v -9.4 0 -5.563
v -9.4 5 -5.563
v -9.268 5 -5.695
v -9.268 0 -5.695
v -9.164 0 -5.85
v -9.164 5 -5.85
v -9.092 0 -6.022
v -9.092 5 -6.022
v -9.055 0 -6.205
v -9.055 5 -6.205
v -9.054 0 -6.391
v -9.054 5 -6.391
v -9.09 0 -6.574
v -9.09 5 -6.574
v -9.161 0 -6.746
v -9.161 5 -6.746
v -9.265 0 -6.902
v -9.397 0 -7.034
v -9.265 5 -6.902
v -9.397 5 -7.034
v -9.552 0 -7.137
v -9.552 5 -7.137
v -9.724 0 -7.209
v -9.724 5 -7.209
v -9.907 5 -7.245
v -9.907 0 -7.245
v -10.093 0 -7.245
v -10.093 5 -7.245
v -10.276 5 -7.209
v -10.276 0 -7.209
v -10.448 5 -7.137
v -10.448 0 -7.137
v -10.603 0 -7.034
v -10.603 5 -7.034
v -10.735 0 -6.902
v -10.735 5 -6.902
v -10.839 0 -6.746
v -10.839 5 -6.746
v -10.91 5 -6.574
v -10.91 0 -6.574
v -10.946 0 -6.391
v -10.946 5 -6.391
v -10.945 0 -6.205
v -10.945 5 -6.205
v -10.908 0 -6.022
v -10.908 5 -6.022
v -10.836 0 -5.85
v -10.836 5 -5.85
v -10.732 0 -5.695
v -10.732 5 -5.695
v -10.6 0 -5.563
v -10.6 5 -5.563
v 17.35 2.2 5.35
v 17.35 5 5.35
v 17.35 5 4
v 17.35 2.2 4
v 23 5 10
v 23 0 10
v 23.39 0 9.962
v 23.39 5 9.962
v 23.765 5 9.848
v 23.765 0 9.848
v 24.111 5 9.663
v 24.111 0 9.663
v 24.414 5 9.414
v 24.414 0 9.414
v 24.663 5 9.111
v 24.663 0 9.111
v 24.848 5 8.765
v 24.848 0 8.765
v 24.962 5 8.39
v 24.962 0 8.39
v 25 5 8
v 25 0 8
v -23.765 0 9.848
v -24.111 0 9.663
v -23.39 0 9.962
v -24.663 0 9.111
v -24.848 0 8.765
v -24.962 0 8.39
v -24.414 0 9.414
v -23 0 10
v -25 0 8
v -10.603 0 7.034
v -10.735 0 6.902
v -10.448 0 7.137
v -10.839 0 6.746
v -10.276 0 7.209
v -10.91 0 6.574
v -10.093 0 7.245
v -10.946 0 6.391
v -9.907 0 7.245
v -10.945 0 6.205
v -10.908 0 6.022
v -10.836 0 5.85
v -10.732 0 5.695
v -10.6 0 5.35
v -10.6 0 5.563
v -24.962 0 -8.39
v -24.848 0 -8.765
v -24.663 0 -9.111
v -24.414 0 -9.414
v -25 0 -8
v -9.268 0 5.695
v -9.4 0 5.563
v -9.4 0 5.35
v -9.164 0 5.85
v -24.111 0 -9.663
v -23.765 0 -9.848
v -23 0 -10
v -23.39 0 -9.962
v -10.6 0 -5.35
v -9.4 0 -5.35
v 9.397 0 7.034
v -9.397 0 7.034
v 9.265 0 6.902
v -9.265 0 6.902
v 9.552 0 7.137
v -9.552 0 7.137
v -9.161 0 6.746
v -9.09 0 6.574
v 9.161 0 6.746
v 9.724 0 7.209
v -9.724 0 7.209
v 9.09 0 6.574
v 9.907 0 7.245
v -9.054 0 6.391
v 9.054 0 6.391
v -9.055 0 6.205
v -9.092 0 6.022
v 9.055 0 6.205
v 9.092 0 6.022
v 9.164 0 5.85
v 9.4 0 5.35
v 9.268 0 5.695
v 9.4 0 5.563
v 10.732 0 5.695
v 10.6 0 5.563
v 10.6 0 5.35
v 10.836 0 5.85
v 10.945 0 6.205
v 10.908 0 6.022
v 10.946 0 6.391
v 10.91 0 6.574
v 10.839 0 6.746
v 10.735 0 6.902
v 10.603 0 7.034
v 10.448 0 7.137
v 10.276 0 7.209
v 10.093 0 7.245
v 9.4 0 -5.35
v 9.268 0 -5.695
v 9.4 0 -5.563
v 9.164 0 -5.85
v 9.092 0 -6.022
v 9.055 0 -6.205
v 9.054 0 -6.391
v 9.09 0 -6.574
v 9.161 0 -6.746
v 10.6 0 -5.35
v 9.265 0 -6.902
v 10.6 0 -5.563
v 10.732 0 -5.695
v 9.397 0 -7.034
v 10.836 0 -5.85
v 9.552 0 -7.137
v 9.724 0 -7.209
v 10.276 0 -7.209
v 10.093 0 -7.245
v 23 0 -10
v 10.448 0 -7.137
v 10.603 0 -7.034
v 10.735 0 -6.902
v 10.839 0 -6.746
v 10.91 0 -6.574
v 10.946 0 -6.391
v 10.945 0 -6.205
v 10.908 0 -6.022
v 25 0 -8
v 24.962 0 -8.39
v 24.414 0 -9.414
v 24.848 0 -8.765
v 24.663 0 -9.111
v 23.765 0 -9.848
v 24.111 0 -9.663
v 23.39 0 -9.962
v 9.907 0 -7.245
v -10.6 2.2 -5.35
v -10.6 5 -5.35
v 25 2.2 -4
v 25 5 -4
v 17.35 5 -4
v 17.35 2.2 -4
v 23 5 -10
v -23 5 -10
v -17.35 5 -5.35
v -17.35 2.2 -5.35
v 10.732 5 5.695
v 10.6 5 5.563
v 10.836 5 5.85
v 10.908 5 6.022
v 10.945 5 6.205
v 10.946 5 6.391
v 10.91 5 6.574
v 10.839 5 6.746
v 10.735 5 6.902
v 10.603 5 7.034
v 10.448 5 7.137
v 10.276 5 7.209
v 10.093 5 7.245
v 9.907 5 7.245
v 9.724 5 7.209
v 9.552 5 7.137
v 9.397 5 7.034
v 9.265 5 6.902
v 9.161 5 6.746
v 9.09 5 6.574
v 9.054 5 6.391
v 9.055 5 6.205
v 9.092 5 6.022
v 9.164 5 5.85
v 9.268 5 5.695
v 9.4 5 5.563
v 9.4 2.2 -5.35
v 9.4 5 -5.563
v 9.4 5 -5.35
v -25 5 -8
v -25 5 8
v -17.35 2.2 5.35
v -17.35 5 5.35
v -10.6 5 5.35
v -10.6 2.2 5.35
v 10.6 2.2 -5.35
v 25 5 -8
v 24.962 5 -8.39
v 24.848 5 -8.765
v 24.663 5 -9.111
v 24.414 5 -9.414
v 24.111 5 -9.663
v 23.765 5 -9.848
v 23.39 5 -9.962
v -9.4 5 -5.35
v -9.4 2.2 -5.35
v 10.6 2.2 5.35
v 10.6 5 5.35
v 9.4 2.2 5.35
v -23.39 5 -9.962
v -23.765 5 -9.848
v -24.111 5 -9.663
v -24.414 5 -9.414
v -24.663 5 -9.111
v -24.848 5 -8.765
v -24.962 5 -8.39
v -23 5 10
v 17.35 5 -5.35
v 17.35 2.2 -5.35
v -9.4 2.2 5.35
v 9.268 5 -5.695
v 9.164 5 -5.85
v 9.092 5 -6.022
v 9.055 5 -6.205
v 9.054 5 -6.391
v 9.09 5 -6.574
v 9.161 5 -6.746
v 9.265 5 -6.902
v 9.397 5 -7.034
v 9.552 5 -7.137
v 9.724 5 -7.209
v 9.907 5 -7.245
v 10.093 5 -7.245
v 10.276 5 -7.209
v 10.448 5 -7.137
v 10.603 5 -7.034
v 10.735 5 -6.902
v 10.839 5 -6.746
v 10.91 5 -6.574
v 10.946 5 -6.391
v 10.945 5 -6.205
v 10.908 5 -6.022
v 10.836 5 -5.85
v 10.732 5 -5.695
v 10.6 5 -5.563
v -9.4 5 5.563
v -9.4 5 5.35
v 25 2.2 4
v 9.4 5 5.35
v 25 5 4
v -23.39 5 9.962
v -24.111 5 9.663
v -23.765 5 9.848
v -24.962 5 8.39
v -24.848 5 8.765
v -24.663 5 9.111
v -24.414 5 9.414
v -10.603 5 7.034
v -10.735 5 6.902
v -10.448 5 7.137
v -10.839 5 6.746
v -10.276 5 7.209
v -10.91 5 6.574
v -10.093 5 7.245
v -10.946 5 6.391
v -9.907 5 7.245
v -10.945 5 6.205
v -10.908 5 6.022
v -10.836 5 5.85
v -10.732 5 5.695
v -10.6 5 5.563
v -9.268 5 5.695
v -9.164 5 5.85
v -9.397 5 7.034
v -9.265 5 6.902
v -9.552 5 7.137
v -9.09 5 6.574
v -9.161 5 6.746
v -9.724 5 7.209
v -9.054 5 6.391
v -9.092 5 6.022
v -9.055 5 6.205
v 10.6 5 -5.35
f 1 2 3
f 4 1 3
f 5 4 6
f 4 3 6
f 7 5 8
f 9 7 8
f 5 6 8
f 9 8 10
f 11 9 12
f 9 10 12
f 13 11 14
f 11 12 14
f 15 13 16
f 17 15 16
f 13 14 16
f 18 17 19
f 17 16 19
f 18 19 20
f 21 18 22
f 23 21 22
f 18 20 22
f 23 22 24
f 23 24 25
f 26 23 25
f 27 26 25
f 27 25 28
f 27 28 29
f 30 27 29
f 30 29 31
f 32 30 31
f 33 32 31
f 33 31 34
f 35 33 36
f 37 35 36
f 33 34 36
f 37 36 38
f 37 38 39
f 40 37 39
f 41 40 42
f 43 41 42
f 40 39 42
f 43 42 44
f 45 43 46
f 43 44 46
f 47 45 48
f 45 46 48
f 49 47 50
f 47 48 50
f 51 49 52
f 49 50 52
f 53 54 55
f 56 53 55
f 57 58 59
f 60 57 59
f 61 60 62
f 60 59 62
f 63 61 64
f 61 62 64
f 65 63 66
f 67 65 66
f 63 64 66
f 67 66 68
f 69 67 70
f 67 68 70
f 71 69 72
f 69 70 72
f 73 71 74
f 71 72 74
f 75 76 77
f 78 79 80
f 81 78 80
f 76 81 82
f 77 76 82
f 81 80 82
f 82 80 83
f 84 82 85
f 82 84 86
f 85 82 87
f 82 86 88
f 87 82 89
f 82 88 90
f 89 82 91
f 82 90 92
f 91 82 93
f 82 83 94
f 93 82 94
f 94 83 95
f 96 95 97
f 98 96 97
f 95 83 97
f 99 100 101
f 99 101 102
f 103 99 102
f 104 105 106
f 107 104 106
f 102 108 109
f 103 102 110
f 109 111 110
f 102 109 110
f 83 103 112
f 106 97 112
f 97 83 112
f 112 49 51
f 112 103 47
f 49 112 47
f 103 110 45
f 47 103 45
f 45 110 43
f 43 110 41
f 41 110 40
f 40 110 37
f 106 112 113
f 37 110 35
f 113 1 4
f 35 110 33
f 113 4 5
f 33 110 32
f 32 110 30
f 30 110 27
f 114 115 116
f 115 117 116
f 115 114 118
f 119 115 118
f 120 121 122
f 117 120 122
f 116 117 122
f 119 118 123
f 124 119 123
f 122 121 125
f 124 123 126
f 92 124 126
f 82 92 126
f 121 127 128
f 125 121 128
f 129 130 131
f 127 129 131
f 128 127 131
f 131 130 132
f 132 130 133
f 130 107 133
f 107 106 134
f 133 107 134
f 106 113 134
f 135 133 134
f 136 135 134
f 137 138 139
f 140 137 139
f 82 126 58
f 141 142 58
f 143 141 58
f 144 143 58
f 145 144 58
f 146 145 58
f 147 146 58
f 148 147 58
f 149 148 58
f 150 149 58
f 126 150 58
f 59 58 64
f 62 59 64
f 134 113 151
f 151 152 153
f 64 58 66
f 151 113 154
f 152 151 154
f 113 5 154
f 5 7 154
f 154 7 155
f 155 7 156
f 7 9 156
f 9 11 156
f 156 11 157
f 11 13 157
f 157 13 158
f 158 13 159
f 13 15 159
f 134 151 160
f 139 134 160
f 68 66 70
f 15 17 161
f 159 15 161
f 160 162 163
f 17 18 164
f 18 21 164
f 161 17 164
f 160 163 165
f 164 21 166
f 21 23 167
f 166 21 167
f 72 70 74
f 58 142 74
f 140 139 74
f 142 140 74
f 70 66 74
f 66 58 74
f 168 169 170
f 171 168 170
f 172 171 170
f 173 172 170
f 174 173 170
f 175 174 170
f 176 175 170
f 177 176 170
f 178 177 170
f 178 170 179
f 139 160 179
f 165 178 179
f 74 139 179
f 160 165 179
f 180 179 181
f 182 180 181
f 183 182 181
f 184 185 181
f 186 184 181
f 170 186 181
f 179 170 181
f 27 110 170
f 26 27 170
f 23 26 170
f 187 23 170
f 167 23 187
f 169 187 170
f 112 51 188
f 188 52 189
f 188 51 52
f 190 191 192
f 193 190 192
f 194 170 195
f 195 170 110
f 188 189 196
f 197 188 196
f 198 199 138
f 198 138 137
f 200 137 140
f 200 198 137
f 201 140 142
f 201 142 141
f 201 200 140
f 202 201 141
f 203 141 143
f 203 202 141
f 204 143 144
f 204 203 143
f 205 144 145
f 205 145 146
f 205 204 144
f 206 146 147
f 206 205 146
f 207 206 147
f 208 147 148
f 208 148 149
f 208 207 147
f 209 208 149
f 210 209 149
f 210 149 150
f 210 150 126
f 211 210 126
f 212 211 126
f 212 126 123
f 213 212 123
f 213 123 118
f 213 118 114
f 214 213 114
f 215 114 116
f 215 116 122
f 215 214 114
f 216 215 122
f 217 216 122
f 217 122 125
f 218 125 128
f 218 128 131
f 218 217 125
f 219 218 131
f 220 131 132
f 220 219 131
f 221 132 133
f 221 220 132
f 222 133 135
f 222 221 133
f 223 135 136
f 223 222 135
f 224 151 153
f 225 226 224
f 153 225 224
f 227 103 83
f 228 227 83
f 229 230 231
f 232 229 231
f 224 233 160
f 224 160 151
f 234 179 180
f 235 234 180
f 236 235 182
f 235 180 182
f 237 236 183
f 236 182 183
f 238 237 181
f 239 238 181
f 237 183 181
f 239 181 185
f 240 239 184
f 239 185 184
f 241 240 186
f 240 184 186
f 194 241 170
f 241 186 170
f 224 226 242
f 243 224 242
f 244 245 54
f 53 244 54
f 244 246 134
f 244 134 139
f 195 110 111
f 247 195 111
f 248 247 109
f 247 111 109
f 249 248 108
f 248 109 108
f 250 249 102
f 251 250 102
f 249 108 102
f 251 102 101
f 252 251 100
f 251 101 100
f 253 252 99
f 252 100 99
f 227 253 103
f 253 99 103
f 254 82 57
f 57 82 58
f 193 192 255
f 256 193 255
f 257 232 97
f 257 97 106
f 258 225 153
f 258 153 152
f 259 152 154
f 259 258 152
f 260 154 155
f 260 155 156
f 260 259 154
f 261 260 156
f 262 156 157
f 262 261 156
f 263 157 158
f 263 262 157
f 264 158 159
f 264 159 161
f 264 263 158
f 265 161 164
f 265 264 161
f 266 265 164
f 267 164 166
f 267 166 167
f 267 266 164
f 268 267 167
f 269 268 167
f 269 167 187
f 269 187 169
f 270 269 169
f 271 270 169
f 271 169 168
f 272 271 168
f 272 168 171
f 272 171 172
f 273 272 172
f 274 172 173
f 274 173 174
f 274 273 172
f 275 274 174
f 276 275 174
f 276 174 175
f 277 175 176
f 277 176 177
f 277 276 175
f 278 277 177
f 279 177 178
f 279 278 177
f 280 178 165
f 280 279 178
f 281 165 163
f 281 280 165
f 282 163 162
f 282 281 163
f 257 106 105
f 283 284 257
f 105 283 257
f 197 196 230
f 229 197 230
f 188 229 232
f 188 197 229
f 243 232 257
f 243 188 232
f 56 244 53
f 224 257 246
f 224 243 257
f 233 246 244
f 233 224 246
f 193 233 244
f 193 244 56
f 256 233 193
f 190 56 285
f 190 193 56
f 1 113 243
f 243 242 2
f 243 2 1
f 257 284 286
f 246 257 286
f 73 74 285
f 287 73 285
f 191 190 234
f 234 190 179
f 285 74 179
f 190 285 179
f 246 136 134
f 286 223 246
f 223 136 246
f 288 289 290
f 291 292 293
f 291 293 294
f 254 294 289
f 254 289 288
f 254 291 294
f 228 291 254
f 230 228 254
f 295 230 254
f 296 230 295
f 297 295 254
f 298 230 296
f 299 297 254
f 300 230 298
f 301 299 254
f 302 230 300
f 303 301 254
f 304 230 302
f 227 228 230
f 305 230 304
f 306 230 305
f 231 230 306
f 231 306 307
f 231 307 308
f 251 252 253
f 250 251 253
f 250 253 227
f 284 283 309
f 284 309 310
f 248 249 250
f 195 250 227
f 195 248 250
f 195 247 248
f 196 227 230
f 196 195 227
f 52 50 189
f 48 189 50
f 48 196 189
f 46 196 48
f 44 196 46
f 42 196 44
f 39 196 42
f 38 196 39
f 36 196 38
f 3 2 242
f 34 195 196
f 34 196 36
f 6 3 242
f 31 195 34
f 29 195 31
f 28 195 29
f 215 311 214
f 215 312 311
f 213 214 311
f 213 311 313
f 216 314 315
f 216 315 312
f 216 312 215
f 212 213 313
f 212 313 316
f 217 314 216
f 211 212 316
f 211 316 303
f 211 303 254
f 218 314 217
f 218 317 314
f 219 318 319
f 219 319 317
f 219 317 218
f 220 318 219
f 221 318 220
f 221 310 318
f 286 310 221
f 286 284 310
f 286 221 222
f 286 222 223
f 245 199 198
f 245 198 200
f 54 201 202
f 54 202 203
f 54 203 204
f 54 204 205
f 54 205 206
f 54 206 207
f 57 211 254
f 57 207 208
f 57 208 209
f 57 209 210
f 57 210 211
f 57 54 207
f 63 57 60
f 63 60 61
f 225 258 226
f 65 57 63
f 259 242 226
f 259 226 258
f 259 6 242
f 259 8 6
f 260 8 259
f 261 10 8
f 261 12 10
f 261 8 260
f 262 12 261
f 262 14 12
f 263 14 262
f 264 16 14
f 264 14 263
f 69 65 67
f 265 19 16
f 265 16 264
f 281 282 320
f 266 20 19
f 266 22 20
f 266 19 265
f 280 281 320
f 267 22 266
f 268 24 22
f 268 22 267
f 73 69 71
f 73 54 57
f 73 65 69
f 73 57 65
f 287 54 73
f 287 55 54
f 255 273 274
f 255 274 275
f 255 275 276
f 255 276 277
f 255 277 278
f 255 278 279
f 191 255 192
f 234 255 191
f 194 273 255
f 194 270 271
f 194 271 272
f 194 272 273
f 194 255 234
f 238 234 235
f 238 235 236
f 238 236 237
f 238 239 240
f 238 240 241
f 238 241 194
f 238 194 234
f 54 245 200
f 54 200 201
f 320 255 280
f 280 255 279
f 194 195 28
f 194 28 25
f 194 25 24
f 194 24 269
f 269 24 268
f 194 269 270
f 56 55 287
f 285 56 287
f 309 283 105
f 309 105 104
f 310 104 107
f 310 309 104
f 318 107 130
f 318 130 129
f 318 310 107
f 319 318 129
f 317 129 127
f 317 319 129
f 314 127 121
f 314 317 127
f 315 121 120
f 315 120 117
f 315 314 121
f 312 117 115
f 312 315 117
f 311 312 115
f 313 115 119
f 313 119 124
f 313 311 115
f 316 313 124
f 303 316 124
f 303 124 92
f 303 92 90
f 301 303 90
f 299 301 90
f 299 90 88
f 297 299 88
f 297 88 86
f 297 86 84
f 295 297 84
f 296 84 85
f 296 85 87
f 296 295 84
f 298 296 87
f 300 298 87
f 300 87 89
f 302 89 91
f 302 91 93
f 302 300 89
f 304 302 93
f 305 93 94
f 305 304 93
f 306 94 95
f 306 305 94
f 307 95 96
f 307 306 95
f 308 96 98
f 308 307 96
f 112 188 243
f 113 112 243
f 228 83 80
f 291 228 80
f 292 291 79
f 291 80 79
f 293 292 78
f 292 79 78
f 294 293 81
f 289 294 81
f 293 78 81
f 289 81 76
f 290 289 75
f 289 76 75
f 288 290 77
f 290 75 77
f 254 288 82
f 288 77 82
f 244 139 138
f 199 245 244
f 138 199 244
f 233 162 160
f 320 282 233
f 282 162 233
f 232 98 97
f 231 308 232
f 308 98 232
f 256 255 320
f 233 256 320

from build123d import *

# Parameters (mm, degrees)
EXTRUDE_1_DEPTH     = 5
CUT_EXTRUDE_1_DEPTH = 2.8
CUT_EXTRUDE_2_DEPTH = 5


with BuildPart() as part:
    # 草圖1 → 填料-伸長1 (new body)
    with BuildSketch(Plane(origin=(0, 0, 0), x_dir=(1, 0, 0), z_dir=(0, 1, 0))):
        with BuildLine():
            Line((-23, -10), (23, -10))
            ThreePointArc((23, -10), (24.414213562, -9.414213562), (25, -8))
            Line((25, -8), (25, 8))
            ThreePointArc((25, 8), (24.414213562, 9.414213562), (23, 10))
            Line((23, 10), (-23, 10))
            ThreePointArc((-23, 10), (-24.414213562, 9.414213562), (-25, 8))
            Line((-25, 8), (-25, -8))
            ThreePointArc((-25, -8), (-24.414213562, -9.414213562), (-23, -10))
        make_face()
    extrude(amount=EXTRUDE_1_DEPTH)

    # 草圖2 → 除料-伸長1 (cut)
    with BuildSketch(Plane(origin=(0, 5, 0), x_dir=(1, 0, 0), z_dir=(0, 1, 0))):
        Polygon((-17.35, -5.35), (17.35, -5.35), (17.35, -4), (25, -4), (25, 4), (17.35, 4), (17.35, 5.35), (-17.35, 5.35), align=None)
    extrude(amount=-CUT_EXTRUDE_1_DEPTH, mode=Mode.SUBTRACT)

    # 草圖3 → 除料-伸長2 (cut)
    with BuildSketch(Plane(origin=(0, 5, 0), x_dir=(1, 0, 0), z_dir=(0, 1, 0))):
        with BuildLine():
            Line((-10.6, 5.563454007), (-10.6, 5.35))
            Line((-10.6, 5.35), (-9.4, 5.35))
            Line((-9.4, 5.35), (-9.4, 5.563454007))
            ThreePointArc((-9.4, 5.563454007), (-10, 7.25), (-10.6, 5.563454007))
        make_face()
        with BuildLine():
            Line((-10.6, -5.35), (-9.4, -5.35))
            Line((-9.4, -5.35), (-9.4, -5.563454007))
            ThreePointArc((-9.4, -5.563454007), (-10, -7.25), (-10.6, -5.563454007))
            Line((-10.6, -5.563454007), (-10.6, -5.35))
        make_face()
        with BuildLine():
            Line((10.6, 5.563454007), (10.6, 5.35))
            Line((10.6, 5.35), (9.4, 5.35))
            Line((9.4, 5.35), (9.4, 5.563454007))
            ThreePointArc((9.4, 5.563454007), (10, 7.25), (10.6, 5.563454007))
        make_face()
        with BuildLine():
            Line((9.4, -5.563454007), (9.4, -5.35))
            Line((9.4, -5.35), (10.6, -5.35))
            Line((10.6, -5.35), (10.6, -5.563454007))
            ThreePointArc((10.6, -5.563454007), (10, -7.25), (9.4, -5.563454007))
        make_face()
    extrude(amount=-CUT_EXTRUDE_2_DEPTH, mode=Mode.SUBTRACT)


solid = part.part
